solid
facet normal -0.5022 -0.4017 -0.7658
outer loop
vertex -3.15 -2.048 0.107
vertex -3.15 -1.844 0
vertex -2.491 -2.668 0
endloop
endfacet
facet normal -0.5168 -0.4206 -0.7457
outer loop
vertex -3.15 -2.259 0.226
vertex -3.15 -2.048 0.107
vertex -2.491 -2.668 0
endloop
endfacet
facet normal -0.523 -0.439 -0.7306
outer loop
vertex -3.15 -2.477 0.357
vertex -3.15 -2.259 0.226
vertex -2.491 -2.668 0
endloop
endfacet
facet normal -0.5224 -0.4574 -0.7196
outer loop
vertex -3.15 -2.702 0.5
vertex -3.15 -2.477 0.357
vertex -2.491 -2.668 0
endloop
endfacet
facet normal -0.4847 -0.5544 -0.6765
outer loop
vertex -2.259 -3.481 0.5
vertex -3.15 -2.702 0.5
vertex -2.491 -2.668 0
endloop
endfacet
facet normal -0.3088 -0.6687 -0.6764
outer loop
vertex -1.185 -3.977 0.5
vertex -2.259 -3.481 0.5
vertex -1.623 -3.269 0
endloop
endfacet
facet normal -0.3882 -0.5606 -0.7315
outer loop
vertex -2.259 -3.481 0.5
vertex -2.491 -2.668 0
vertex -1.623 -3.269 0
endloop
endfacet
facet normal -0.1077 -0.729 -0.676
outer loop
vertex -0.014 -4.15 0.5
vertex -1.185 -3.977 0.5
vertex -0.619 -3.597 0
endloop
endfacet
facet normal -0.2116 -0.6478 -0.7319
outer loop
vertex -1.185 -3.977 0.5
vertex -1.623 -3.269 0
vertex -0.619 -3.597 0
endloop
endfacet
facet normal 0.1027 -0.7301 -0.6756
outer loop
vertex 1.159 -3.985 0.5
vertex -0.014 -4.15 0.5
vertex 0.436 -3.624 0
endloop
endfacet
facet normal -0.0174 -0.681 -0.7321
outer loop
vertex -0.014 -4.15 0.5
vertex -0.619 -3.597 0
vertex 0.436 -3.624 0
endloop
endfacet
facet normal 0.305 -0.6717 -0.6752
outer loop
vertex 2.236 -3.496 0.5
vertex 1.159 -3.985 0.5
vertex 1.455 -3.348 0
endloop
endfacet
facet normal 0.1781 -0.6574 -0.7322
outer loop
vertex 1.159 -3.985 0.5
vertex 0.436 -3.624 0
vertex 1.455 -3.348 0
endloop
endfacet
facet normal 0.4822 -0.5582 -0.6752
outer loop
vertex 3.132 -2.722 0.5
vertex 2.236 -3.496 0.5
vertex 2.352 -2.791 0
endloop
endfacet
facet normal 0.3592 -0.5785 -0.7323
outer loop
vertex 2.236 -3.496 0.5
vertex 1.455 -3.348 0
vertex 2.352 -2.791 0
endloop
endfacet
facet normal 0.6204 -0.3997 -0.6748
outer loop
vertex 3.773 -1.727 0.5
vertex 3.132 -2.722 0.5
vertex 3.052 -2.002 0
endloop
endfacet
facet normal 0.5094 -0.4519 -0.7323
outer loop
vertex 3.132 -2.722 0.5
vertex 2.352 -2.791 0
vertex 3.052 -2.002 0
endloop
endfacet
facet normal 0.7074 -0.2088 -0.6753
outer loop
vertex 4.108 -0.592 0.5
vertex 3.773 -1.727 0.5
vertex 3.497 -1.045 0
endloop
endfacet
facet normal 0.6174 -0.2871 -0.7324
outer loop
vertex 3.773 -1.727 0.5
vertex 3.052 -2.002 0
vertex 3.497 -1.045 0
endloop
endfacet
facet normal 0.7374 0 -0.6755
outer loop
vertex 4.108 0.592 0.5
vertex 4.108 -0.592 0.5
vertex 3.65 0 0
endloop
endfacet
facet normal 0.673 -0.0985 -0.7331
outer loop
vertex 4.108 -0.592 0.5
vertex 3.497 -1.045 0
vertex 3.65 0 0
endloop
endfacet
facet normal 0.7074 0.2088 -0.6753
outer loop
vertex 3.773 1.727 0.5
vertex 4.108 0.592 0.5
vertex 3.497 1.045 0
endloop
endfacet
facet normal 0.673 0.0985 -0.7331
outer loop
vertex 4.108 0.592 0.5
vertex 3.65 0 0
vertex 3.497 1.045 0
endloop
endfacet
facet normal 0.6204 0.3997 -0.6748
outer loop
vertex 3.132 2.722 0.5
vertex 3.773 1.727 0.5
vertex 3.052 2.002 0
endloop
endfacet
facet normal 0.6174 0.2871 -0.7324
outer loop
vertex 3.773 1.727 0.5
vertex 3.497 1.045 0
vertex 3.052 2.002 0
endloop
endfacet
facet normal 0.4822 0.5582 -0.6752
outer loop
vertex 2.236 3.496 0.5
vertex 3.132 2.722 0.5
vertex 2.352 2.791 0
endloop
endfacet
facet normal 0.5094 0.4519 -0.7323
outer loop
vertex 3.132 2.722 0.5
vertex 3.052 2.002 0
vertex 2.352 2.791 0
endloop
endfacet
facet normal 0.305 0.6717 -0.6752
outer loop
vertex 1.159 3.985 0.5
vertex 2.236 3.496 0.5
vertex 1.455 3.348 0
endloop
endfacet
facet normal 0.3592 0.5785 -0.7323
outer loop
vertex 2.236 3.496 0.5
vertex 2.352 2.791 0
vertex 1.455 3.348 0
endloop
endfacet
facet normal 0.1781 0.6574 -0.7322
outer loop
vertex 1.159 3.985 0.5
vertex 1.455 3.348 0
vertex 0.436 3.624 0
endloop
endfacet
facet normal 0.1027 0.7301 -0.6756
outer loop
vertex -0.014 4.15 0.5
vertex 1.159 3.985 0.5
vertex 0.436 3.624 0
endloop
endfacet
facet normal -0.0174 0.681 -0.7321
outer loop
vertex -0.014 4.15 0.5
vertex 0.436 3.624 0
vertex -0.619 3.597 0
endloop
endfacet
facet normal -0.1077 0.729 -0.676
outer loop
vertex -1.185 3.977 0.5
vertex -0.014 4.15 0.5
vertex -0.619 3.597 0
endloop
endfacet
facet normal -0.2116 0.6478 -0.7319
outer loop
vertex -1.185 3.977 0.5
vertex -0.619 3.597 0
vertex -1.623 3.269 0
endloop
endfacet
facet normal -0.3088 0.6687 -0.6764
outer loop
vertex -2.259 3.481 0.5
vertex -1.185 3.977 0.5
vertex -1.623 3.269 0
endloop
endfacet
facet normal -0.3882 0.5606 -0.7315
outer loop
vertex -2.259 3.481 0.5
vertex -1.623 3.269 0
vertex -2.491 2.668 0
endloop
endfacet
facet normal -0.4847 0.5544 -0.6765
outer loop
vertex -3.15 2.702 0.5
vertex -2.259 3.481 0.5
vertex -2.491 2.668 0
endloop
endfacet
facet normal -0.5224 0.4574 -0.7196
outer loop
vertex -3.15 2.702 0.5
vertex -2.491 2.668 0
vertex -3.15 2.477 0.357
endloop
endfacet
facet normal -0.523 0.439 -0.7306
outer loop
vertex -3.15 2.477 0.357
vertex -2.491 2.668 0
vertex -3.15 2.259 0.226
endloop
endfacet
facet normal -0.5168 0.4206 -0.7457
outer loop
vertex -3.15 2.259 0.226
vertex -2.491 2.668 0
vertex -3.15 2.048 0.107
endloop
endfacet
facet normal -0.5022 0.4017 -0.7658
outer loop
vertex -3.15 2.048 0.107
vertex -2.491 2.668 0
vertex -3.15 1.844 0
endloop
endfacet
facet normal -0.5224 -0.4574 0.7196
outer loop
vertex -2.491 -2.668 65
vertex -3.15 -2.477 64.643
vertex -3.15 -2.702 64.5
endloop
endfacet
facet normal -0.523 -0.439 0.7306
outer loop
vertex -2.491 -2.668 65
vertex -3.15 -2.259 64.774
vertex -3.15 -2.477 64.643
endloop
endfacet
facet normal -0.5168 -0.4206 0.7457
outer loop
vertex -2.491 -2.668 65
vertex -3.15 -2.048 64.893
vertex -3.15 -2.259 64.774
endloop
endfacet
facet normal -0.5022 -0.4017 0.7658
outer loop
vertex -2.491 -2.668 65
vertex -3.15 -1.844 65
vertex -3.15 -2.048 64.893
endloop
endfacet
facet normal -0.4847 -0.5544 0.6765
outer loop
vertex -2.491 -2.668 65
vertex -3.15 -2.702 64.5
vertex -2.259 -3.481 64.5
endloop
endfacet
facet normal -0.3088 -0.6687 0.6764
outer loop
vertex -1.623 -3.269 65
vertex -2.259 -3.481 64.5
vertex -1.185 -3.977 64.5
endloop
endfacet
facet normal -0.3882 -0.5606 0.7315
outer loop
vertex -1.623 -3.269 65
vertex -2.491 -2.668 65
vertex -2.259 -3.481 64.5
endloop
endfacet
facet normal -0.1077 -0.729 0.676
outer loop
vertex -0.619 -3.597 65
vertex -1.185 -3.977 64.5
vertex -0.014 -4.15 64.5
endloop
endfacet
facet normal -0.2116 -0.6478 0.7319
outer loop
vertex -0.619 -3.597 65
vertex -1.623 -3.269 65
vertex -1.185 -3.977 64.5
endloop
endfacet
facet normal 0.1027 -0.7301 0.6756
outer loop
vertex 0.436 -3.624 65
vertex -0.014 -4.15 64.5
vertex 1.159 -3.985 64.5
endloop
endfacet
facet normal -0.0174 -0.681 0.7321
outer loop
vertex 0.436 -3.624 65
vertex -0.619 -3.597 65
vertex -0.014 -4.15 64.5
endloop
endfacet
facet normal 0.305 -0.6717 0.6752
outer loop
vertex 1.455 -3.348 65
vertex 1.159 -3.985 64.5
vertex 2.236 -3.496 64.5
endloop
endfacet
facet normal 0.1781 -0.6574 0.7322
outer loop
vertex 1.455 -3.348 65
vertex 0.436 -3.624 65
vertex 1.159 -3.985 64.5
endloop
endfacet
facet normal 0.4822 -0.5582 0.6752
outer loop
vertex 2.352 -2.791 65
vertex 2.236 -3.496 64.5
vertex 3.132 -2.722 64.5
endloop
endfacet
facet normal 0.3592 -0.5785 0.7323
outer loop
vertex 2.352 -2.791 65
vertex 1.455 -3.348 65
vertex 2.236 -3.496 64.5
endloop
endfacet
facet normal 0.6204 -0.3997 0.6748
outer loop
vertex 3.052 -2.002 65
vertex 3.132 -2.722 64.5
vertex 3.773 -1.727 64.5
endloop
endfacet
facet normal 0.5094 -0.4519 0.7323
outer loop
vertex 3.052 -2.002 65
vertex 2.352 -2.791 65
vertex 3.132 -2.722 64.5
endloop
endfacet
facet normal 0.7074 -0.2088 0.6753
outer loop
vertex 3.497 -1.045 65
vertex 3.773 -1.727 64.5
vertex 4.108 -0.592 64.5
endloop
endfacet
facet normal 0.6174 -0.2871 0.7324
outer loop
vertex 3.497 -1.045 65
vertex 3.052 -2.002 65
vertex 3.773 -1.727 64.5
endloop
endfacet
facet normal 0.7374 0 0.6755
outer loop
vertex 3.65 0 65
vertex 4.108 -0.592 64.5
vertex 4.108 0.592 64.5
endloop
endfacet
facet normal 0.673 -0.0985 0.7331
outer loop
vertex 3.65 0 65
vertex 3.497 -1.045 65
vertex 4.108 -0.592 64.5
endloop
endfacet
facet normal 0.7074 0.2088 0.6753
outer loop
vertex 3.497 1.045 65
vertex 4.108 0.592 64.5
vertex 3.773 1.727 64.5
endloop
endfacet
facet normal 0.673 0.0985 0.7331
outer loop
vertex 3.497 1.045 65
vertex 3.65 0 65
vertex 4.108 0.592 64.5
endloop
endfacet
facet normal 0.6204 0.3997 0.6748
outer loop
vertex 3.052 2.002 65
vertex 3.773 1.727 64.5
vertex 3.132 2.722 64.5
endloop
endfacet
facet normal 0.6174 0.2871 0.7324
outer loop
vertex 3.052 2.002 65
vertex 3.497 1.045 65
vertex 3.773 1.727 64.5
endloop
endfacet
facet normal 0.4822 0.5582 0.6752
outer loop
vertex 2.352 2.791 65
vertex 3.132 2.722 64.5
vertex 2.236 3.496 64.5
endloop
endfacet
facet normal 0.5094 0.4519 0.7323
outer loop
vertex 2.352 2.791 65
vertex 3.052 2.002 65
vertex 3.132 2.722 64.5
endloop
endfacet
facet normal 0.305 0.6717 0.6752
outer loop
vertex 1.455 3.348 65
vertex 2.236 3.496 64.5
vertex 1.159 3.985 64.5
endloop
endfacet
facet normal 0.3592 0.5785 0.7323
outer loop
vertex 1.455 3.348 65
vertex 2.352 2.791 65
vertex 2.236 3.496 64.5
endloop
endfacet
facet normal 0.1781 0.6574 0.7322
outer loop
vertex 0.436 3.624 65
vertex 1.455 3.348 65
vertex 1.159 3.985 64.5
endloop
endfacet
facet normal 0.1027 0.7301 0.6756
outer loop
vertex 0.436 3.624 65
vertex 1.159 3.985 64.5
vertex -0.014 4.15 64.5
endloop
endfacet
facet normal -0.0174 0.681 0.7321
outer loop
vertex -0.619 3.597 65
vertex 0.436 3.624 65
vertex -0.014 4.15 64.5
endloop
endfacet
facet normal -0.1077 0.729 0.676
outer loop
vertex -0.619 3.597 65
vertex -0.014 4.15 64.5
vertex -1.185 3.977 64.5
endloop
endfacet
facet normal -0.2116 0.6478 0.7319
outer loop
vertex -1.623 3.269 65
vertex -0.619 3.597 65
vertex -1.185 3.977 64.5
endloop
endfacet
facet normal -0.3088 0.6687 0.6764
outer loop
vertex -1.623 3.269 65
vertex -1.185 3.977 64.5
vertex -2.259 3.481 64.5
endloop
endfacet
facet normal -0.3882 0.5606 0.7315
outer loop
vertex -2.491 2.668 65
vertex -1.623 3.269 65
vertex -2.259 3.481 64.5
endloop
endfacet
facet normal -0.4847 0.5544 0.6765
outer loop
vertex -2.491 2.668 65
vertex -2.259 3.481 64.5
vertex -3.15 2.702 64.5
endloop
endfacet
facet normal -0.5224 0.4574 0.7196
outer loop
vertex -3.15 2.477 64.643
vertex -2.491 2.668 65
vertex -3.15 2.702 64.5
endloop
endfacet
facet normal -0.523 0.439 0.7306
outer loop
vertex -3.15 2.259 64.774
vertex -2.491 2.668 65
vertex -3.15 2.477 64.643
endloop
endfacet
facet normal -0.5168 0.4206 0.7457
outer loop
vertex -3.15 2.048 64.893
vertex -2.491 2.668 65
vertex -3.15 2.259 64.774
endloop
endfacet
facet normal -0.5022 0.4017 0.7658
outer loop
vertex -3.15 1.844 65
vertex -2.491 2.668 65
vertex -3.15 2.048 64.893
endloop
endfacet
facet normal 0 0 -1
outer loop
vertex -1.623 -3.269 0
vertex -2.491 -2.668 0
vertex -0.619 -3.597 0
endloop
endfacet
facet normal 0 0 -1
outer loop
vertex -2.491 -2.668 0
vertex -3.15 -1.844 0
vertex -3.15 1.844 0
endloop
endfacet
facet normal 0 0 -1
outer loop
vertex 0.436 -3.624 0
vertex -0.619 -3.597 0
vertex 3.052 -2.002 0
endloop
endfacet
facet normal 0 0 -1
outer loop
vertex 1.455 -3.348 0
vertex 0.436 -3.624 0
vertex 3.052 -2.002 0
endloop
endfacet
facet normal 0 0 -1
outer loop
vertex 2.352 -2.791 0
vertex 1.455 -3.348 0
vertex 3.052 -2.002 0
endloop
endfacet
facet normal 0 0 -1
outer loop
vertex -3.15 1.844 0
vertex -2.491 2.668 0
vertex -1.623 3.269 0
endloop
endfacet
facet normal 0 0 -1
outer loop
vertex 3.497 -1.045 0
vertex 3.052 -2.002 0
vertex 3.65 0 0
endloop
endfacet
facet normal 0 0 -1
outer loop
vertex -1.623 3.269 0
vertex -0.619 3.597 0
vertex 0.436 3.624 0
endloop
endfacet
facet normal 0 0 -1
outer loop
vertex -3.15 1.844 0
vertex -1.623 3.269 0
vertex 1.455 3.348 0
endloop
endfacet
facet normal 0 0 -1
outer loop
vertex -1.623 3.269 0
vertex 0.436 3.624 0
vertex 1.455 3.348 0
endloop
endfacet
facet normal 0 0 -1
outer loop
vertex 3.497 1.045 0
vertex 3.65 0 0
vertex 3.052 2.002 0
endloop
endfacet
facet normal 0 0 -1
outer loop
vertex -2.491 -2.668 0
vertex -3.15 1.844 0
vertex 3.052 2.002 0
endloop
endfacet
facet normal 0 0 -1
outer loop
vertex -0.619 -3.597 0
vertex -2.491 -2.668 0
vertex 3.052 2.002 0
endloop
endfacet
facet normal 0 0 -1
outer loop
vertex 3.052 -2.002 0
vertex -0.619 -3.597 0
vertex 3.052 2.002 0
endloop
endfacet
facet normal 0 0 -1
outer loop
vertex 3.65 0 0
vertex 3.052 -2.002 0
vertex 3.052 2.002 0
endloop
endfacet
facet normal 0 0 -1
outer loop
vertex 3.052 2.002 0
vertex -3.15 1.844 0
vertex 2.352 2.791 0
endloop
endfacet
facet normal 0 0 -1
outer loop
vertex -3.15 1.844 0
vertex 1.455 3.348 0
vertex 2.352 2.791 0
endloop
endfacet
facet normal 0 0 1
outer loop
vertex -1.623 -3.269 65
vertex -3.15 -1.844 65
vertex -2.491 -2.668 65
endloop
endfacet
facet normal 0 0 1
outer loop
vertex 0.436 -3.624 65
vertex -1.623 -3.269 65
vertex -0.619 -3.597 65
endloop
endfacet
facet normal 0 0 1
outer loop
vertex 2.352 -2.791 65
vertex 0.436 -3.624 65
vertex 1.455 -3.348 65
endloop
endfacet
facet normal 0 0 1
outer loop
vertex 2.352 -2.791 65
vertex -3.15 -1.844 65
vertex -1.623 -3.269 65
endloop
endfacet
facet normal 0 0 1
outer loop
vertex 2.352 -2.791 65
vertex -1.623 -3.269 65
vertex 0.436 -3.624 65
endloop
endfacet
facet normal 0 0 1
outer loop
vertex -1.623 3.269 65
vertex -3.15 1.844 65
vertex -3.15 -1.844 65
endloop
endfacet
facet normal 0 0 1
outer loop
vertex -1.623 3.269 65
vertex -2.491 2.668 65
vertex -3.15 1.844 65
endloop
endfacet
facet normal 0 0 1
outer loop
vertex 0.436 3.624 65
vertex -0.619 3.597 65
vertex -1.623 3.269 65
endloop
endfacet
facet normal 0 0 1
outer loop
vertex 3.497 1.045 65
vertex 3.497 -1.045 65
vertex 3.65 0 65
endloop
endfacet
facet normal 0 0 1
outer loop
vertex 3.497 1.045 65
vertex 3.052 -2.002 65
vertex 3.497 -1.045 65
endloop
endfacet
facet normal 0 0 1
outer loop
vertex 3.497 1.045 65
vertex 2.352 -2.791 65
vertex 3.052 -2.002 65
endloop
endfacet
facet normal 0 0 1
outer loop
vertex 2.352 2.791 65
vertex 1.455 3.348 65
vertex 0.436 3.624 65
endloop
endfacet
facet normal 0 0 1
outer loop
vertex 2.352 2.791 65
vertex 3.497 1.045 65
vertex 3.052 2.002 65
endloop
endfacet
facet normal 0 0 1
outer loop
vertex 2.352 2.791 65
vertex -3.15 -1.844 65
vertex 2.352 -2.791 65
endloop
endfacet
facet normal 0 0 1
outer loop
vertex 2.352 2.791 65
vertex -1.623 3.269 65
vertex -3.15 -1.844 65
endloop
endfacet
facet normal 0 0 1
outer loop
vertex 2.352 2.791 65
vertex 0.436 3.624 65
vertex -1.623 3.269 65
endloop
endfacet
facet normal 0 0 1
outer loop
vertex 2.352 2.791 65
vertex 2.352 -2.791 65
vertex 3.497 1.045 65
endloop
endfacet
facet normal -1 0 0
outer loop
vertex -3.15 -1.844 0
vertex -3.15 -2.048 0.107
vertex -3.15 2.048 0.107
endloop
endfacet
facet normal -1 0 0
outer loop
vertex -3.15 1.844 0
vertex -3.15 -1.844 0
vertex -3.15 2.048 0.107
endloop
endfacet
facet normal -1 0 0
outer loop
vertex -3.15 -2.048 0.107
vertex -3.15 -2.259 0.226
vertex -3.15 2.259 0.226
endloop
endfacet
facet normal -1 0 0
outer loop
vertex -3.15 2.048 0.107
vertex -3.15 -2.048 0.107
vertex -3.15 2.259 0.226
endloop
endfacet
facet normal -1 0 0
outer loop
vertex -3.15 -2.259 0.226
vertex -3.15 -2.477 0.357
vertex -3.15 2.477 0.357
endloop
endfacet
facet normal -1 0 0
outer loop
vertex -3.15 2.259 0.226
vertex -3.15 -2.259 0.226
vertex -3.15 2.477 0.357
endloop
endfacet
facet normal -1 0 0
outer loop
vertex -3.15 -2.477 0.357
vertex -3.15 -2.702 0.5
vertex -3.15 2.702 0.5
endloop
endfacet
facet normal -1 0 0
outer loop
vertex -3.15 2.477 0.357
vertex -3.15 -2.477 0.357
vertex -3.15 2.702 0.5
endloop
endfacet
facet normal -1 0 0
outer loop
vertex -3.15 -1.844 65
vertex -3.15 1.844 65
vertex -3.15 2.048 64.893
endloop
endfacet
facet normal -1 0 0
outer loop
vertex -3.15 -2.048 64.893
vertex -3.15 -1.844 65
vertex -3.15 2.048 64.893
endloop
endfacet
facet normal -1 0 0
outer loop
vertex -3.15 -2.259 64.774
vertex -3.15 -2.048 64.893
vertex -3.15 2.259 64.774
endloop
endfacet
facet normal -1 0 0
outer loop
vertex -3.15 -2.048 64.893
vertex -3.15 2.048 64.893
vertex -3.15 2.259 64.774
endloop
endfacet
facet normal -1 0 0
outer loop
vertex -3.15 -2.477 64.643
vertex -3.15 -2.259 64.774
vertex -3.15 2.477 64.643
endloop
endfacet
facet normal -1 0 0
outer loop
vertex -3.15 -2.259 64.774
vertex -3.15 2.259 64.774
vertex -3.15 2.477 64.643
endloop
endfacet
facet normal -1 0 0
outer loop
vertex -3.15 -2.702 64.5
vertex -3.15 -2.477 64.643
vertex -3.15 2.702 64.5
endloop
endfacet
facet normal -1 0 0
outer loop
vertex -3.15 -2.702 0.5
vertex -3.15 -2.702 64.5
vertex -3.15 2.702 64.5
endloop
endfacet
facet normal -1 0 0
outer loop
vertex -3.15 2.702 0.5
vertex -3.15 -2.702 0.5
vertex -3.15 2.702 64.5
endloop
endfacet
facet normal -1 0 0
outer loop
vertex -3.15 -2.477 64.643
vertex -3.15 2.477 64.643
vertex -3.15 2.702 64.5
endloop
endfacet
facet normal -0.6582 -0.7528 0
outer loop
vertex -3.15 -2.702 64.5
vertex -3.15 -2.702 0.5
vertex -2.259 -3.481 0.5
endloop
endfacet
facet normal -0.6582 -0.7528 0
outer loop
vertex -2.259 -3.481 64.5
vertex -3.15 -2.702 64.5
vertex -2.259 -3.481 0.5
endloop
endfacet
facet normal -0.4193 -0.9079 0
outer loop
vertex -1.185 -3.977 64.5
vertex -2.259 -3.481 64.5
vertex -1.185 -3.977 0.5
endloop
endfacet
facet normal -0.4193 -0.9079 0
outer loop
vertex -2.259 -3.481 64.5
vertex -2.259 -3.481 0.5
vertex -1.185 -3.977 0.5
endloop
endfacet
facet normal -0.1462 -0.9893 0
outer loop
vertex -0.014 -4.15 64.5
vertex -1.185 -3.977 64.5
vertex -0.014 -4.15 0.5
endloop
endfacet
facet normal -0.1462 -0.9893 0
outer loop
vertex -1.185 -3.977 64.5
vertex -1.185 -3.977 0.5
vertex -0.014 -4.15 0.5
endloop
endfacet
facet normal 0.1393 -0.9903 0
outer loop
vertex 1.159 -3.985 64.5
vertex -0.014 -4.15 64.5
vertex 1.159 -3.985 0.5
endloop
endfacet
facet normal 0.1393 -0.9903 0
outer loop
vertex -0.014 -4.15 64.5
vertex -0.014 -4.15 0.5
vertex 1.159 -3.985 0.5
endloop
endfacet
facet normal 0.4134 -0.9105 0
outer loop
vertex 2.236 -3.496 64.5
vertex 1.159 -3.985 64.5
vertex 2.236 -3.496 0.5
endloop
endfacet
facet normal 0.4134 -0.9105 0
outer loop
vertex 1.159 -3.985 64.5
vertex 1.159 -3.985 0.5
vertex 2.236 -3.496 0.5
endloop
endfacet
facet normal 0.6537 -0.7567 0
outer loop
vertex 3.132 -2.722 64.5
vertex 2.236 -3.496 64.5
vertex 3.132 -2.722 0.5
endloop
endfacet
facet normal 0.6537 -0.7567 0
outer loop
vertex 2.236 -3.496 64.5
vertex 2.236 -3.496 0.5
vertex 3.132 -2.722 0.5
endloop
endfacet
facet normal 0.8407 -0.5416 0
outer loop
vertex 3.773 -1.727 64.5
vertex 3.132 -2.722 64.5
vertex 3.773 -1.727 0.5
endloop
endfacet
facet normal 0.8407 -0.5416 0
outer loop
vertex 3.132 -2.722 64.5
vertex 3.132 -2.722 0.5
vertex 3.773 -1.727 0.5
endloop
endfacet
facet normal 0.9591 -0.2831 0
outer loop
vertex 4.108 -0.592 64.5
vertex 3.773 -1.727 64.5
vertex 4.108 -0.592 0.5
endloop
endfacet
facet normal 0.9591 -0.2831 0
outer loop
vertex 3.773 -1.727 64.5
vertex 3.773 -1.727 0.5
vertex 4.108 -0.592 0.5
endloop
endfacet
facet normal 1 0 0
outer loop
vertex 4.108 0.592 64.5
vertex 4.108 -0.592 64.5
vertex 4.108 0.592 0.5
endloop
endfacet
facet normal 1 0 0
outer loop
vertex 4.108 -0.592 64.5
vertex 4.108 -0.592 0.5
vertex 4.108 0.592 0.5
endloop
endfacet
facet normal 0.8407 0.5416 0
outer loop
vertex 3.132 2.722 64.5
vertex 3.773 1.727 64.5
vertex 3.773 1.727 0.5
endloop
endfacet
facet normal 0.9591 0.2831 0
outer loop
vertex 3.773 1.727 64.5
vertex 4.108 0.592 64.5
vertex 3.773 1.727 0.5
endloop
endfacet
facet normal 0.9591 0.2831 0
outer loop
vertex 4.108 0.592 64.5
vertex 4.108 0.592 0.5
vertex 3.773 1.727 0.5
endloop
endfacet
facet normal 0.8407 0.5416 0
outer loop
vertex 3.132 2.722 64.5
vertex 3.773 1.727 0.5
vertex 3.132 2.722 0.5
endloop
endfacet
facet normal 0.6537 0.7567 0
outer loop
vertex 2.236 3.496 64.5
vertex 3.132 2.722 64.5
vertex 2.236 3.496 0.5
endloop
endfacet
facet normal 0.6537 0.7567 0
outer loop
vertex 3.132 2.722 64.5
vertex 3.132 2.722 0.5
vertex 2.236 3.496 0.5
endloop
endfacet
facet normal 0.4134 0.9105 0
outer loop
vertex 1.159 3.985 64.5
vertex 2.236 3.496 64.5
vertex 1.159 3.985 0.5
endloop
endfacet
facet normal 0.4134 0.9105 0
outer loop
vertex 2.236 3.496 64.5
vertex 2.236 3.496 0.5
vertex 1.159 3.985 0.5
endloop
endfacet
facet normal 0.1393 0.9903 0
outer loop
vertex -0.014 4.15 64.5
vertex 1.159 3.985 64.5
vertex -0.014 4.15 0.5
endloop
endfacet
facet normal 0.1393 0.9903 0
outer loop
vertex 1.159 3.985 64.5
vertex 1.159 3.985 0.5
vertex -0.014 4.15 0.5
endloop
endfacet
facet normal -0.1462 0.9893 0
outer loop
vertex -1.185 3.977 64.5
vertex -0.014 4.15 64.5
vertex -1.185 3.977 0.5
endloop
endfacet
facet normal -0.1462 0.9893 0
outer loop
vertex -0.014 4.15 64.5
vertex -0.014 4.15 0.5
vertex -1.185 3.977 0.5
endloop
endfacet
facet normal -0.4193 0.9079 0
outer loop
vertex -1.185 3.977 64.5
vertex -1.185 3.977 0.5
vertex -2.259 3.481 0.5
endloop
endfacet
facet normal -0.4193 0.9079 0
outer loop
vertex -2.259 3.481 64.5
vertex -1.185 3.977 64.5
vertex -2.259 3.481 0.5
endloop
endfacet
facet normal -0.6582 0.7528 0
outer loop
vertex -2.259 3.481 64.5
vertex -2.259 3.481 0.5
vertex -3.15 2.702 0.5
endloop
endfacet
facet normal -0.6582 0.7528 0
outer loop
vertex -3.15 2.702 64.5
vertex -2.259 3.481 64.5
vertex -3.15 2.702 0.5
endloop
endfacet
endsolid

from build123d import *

# Parameters (mm, degrees)
SKETCH1_R           = 4.15
BOSS_EXTRUDE1_DEPTH = 65
CHAMFER1_SIZE       = 0.5
SKETCH2_W           = 1.287128146
SKETCH2_H           = 7.63924008
CUT_EXTRUDE1_DEPTH  = 33


with BuildPart() as part:
    # Sketch1 → Boss-Extrude1 (new body)
    with BuildSketch(Plane.XY):
        Circle(SKETCH1_R)
    extrude(amount=BOSS_EXTRUDE1_DEPTH)

    # Chamfer1
    chamfer1_edges = [part.edges().sort_by_distance(p)[0] for p in [
        (-4.15, 0, 0),
        (-4.15, 0, 65),
    ]]
    chamfer(chamfer1_edges, length=CHAMFER1_SIZE)

    # Sketch2 → Cut-Extrude1 (cut, symmetric)
    with BuildSketch(Plane.XY.offset(32.5)):
        with Locations((-3.793564073, 0)):
            Rectangle(SKETCH2_W, SKETCH2_H)
    extrude(amount=CUT_EXTRUDE1_DEPTH, both=True, mode=Mode.SUBTRACT)


solid = part.part
